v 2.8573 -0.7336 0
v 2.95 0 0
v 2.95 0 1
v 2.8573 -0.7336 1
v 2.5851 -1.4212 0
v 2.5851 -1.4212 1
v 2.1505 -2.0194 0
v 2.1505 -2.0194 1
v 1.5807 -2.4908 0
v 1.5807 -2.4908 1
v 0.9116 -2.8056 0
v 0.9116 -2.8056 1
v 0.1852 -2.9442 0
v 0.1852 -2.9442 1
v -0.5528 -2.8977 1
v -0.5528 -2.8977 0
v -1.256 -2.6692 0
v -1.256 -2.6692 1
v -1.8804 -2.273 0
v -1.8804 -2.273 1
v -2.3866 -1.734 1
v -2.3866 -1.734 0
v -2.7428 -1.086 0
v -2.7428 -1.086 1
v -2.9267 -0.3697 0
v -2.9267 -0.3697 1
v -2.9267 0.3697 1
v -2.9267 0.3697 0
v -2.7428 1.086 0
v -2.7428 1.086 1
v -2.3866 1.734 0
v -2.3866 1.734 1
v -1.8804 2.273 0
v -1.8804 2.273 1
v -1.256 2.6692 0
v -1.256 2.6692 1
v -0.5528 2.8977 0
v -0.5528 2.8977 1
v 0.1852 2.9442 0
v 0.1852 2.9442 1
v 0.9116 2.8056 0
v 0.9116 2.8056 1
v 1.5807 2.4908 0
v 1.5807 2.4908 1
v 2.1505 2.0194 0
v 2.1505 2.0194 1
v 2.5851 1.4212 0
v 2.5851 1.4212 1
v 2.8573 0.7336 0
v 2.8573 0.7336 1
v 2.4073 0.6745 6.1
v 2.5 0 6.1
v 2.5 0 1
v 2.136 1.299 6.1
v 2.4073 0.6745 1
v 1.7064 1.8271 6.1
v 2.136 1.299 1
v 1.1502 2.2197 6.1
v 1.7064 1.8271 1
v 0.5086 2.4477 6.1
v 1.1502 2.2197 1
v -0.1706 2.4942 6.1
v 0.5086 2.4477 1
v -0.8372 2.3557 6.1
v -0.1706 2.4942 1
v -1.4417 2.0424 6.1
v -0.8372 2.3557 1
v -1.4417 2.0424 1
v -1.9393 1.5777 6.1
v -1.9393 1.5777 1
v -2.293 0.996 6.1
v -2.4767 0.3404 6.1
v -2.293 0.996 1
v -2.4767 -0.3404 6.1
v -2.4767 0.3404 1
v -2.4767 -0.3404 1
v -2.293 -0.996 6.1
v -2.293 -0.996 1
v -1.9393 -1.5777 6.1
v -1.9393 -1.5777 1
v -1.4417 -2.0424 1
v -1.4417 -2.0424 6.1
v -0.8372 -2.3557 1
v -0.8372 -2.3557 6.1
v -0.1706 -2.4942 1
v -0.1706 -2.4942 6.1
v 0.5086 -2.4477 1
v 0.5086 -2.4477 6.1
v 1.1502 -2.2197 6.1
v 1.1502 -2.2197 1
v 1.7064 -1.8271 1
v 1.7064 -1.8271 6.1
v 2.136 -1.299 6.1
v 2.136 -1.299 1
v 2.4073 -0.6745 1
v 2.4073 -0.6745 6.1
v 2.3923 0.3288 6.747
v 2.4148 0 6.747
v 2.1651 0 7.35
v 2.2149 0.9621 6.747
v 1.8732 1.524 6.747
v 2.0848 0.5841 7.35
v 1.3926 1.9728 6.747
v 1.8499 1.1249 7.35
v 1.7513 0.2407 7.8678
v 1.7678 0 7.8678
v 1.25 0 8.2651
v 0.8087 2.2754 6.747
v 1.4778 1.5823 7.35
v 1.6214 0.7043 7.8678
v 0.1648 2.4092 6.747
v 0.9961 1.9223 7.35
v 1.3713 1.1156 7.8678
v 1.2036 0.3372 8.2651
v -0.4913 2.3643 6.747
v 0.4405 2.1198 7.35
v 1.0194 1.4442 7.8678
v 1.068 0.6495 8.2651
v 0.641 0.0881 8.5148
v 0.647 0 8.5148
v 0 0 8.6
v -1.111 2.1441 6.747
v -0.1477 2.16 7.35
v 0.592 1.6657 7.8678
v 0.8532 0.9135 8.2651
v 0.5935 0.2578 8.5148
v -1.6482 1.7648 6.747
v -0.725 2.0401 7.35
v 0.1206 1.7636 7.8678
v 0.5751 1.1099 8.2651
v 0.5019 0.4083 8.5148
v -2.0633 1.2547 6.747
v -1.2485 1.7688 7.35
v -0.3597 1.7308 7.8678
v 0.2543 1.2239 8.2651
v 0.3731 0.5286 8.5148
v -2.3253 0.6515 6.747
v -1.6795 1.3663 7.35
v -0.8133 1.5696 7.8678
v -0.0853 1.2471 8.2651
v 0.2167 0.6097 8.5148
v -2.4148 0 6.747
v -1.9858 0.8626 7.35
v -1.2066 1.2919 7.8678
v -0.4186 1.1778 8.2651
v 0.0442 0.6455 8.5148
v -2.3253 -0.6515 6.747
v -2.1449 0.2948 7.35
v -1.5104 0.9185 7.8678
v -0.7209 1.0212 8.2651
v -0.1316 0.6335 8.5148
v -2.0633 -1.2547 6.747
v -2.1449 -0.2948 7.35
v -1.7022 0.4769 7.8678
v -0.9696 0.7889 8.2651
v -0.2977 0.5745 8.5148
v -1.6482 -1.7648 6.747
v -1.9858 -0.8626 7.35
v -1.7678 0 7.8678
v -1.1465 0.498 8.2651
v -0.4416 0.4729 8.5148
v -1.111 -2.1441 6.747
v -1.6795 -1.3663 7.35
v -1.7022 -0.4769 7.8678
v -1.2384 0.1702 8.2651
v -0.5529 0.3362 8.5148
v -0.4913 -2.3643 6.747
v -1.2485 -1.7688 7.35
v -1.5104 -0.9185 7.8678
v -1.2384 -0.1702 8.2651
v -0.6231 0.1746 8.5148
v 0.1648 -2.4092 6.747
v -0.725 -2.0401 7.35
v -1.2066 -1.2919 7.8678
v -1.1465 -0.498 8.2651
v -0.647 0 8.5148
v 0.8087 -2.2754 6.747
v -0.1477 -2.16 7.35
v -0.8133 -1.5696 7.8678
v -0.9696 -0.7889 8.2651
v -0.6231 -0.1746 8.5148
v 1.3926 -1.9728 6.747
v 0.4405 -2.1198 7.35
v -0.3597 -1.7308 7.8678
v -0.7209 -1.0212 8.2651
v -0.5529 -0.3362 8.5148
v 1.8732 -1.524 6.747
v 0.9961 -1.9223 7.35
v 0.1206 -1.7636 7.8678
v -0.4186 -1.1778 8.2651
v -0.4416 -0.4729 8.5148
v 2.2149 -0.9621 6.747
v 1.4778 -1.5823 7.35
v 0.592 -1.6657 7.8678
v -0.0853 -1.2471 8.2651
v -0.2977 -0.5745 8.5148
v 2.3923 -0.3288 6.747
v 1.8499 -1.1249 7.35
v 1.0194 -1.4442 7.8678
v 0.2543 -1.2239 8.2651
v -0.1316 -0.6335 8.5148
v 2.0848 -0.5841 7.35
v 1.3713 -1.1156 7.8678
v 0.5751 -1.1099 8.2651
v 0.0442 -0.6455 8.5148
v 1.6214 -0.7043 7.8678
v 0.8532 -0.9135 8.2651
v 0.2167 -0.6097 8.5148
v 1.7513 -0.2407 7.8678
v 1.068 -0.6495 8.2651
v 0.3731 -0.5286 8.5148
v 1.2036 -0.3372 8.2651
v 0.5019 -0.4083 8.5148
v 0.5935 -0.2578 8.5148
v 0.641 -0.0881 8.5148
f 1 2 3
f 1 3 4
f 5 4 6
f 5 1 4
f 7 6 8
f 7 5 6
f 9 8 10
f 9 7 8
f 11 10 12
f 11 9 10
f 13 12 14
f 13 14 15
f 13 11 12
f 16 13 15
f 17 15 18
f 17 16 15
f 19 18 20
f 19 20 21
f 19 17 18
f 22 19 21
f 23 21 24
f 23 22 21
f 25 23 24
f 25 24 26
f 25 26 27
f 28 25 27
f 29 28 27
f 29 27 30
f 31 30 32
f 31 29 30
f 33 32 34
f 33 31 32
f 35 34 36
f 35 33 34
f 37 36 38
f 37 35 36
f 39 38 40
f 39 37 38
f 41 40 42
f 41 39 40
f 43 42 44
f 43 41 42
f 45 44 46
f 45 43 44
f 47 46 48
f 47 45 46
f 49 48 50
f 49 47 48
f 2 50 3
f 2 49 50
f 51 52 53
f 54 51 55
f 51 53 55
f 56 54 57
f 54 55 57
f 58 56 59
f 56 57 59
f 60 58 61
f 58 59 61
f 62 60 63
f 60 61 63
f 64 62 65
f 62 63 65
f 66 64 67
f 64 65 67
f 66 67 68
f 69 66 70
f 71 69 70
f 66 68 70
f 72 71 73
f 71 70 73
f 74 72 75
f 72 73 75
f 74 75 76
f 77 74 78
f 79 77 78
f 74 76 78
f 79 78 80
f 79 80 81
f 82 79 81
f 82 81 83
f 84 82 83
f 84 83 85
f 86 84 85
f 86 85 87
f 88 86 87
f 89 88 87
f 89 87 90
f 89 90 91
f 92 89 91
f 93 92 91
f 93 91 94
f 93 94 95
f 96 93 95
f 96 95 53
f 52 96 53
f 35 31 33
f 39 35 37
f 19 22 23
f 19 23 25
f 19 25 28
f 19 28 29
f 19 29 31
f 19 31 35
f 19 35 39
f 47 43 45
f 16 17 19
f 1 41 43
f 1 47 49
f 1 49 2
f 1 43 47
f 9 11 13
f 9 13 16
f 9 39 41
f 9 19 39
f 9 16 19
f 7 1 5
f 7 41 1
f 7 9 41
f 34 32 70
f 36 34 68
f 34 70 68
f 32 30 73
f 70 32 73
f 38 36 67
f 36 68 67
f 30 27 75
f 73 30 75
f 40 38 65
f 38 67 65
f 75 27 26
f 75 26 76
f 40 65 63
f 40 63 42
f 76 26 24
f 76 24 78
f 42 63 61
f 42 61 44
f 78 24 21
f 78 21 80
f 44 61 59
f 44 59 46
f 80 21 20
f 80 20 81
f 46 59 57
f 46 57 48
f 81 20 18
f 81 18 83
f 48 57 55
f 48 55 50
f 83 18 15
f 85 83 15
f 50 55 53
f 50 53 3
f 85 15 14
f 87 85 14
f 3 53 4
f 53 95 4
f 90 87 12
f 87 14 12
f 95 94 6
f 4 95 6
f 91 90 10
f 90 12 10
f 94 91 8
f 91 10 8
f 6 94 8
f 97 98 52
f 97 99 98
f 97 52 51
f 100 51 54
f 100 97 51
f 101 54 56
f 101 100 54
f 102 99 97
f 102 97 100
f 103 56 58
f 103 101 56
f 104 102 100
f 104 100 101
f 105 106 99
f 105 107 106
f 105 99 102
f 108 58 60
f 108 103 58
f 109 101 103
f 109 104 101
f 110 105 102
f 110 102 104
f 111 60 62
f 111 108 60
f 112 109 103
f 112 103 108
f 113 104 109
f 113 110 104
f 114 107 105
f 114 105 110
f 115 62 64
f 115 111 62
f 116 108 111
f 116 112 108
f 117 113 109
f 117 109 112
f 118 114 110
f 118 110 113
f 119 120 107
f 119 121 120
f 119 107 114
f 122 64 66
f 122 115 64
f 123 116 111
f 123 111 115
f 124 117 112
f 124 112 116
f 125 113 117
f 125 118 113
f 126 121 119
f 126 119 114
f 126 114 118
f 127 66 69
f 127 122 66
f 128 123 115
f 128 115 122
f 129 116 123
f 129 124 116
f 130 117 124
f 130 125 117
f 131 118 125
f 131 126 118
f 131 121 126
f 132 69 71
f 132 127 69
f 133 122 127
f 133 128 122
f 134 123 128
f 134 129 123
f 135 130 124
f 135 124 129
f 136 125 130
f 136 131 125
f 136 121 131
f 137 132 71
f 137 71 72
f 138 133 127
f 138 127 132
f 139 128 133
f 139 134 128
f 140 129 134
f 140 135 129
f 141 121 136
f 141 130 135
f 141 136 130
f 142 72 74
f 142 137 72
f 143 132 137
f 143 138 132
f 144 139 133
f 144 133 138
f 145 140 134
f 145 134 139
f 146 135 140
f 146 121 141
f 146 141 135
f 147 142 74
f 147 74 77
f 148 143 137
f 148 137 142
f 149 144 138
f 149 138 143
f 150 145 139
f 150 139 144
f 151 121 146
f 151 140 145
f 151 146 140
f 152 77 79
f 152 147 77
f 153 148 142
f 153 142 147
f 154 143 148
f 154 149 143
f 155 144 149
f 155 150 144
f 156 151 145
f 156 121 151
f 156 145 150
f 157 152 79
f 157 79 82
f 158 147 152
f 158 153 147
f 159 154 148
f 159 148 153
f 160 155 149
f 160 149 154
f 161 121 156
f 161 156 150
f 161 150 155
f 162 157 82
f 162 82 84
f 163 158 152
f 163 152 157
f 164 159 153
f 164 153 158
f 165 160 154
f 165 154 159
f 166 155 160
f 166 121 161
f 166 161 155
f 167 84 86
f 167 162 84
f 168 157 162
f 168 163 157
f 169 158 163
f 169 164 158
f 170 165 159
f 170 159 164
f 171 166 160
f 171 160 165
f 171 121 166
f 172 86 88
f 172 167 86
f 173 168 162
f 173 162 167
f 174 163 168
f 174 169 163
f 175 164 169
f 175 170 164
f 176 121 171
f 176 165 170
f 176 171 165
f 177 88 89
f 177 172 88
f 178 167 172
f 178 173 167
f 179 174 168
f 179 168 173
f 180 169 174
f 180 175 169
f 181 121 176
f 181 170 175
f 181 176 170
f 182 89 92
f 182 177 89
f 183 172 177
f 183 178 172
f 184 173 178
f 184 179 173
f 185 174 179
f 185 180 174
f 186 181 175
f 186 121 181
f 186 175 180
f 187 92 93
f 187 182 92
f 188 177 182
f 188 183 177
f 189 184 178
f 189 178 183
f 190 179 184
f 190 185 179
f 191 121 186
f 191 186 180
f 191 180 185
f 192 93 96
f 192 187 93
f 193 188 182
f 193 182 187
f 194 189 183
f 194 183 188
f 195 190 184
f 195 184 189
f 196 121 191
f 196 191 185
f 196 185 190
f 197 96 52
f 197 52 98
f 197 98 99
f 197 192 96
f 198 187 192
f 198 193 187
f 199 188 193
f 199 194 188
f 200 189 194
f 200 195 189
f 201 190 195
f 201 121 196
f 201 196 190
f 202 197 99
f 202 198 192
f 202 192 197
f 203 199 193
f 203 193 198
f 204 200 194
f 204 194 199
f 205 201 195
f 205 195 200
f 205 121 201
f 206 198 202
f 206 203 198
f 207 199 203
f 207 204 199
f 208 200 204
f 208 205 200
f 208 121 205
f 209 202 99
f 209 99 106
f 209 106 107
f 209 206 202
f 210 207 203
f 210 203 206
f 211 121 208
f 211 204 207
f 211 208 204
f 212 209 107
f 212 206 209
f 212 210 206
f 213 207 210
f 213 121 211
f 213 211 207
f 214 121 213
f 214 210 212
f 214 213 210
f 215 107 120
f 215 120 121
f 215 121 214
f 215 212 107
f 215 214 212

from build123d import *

# Parameters (mm, degrees)
F0_R     = 2.5
F1_DEPTH = 8.6
F2_R     = 2.5
F3_R     = 2.95
F4_DEPTH = 1


with BuildPart() as f1:
    # F0 (on Top) → F1 (new body)
    with BuildSketch(Plane.XY):
        Circle(F0_R)
    extrude(amount=F1_DEPTH)

    # F2
    f2_edges = [f1.edges().sort_by_distance(p)[0] for p in [
        (-2.5, 0, 8.6),
    ]]
    fillet(f2_edges, radius=F2_R)

    # F3 (on face) → F4 (join)
    with BuildSketch(Plane(origin=(0, 0, 0), x_dir=(1, 0, 0), z_dir=(0, 0, -1))):
        Circle(F3_R)
    extrude(amount=-F4_DEPTH)


solid = f1.part
